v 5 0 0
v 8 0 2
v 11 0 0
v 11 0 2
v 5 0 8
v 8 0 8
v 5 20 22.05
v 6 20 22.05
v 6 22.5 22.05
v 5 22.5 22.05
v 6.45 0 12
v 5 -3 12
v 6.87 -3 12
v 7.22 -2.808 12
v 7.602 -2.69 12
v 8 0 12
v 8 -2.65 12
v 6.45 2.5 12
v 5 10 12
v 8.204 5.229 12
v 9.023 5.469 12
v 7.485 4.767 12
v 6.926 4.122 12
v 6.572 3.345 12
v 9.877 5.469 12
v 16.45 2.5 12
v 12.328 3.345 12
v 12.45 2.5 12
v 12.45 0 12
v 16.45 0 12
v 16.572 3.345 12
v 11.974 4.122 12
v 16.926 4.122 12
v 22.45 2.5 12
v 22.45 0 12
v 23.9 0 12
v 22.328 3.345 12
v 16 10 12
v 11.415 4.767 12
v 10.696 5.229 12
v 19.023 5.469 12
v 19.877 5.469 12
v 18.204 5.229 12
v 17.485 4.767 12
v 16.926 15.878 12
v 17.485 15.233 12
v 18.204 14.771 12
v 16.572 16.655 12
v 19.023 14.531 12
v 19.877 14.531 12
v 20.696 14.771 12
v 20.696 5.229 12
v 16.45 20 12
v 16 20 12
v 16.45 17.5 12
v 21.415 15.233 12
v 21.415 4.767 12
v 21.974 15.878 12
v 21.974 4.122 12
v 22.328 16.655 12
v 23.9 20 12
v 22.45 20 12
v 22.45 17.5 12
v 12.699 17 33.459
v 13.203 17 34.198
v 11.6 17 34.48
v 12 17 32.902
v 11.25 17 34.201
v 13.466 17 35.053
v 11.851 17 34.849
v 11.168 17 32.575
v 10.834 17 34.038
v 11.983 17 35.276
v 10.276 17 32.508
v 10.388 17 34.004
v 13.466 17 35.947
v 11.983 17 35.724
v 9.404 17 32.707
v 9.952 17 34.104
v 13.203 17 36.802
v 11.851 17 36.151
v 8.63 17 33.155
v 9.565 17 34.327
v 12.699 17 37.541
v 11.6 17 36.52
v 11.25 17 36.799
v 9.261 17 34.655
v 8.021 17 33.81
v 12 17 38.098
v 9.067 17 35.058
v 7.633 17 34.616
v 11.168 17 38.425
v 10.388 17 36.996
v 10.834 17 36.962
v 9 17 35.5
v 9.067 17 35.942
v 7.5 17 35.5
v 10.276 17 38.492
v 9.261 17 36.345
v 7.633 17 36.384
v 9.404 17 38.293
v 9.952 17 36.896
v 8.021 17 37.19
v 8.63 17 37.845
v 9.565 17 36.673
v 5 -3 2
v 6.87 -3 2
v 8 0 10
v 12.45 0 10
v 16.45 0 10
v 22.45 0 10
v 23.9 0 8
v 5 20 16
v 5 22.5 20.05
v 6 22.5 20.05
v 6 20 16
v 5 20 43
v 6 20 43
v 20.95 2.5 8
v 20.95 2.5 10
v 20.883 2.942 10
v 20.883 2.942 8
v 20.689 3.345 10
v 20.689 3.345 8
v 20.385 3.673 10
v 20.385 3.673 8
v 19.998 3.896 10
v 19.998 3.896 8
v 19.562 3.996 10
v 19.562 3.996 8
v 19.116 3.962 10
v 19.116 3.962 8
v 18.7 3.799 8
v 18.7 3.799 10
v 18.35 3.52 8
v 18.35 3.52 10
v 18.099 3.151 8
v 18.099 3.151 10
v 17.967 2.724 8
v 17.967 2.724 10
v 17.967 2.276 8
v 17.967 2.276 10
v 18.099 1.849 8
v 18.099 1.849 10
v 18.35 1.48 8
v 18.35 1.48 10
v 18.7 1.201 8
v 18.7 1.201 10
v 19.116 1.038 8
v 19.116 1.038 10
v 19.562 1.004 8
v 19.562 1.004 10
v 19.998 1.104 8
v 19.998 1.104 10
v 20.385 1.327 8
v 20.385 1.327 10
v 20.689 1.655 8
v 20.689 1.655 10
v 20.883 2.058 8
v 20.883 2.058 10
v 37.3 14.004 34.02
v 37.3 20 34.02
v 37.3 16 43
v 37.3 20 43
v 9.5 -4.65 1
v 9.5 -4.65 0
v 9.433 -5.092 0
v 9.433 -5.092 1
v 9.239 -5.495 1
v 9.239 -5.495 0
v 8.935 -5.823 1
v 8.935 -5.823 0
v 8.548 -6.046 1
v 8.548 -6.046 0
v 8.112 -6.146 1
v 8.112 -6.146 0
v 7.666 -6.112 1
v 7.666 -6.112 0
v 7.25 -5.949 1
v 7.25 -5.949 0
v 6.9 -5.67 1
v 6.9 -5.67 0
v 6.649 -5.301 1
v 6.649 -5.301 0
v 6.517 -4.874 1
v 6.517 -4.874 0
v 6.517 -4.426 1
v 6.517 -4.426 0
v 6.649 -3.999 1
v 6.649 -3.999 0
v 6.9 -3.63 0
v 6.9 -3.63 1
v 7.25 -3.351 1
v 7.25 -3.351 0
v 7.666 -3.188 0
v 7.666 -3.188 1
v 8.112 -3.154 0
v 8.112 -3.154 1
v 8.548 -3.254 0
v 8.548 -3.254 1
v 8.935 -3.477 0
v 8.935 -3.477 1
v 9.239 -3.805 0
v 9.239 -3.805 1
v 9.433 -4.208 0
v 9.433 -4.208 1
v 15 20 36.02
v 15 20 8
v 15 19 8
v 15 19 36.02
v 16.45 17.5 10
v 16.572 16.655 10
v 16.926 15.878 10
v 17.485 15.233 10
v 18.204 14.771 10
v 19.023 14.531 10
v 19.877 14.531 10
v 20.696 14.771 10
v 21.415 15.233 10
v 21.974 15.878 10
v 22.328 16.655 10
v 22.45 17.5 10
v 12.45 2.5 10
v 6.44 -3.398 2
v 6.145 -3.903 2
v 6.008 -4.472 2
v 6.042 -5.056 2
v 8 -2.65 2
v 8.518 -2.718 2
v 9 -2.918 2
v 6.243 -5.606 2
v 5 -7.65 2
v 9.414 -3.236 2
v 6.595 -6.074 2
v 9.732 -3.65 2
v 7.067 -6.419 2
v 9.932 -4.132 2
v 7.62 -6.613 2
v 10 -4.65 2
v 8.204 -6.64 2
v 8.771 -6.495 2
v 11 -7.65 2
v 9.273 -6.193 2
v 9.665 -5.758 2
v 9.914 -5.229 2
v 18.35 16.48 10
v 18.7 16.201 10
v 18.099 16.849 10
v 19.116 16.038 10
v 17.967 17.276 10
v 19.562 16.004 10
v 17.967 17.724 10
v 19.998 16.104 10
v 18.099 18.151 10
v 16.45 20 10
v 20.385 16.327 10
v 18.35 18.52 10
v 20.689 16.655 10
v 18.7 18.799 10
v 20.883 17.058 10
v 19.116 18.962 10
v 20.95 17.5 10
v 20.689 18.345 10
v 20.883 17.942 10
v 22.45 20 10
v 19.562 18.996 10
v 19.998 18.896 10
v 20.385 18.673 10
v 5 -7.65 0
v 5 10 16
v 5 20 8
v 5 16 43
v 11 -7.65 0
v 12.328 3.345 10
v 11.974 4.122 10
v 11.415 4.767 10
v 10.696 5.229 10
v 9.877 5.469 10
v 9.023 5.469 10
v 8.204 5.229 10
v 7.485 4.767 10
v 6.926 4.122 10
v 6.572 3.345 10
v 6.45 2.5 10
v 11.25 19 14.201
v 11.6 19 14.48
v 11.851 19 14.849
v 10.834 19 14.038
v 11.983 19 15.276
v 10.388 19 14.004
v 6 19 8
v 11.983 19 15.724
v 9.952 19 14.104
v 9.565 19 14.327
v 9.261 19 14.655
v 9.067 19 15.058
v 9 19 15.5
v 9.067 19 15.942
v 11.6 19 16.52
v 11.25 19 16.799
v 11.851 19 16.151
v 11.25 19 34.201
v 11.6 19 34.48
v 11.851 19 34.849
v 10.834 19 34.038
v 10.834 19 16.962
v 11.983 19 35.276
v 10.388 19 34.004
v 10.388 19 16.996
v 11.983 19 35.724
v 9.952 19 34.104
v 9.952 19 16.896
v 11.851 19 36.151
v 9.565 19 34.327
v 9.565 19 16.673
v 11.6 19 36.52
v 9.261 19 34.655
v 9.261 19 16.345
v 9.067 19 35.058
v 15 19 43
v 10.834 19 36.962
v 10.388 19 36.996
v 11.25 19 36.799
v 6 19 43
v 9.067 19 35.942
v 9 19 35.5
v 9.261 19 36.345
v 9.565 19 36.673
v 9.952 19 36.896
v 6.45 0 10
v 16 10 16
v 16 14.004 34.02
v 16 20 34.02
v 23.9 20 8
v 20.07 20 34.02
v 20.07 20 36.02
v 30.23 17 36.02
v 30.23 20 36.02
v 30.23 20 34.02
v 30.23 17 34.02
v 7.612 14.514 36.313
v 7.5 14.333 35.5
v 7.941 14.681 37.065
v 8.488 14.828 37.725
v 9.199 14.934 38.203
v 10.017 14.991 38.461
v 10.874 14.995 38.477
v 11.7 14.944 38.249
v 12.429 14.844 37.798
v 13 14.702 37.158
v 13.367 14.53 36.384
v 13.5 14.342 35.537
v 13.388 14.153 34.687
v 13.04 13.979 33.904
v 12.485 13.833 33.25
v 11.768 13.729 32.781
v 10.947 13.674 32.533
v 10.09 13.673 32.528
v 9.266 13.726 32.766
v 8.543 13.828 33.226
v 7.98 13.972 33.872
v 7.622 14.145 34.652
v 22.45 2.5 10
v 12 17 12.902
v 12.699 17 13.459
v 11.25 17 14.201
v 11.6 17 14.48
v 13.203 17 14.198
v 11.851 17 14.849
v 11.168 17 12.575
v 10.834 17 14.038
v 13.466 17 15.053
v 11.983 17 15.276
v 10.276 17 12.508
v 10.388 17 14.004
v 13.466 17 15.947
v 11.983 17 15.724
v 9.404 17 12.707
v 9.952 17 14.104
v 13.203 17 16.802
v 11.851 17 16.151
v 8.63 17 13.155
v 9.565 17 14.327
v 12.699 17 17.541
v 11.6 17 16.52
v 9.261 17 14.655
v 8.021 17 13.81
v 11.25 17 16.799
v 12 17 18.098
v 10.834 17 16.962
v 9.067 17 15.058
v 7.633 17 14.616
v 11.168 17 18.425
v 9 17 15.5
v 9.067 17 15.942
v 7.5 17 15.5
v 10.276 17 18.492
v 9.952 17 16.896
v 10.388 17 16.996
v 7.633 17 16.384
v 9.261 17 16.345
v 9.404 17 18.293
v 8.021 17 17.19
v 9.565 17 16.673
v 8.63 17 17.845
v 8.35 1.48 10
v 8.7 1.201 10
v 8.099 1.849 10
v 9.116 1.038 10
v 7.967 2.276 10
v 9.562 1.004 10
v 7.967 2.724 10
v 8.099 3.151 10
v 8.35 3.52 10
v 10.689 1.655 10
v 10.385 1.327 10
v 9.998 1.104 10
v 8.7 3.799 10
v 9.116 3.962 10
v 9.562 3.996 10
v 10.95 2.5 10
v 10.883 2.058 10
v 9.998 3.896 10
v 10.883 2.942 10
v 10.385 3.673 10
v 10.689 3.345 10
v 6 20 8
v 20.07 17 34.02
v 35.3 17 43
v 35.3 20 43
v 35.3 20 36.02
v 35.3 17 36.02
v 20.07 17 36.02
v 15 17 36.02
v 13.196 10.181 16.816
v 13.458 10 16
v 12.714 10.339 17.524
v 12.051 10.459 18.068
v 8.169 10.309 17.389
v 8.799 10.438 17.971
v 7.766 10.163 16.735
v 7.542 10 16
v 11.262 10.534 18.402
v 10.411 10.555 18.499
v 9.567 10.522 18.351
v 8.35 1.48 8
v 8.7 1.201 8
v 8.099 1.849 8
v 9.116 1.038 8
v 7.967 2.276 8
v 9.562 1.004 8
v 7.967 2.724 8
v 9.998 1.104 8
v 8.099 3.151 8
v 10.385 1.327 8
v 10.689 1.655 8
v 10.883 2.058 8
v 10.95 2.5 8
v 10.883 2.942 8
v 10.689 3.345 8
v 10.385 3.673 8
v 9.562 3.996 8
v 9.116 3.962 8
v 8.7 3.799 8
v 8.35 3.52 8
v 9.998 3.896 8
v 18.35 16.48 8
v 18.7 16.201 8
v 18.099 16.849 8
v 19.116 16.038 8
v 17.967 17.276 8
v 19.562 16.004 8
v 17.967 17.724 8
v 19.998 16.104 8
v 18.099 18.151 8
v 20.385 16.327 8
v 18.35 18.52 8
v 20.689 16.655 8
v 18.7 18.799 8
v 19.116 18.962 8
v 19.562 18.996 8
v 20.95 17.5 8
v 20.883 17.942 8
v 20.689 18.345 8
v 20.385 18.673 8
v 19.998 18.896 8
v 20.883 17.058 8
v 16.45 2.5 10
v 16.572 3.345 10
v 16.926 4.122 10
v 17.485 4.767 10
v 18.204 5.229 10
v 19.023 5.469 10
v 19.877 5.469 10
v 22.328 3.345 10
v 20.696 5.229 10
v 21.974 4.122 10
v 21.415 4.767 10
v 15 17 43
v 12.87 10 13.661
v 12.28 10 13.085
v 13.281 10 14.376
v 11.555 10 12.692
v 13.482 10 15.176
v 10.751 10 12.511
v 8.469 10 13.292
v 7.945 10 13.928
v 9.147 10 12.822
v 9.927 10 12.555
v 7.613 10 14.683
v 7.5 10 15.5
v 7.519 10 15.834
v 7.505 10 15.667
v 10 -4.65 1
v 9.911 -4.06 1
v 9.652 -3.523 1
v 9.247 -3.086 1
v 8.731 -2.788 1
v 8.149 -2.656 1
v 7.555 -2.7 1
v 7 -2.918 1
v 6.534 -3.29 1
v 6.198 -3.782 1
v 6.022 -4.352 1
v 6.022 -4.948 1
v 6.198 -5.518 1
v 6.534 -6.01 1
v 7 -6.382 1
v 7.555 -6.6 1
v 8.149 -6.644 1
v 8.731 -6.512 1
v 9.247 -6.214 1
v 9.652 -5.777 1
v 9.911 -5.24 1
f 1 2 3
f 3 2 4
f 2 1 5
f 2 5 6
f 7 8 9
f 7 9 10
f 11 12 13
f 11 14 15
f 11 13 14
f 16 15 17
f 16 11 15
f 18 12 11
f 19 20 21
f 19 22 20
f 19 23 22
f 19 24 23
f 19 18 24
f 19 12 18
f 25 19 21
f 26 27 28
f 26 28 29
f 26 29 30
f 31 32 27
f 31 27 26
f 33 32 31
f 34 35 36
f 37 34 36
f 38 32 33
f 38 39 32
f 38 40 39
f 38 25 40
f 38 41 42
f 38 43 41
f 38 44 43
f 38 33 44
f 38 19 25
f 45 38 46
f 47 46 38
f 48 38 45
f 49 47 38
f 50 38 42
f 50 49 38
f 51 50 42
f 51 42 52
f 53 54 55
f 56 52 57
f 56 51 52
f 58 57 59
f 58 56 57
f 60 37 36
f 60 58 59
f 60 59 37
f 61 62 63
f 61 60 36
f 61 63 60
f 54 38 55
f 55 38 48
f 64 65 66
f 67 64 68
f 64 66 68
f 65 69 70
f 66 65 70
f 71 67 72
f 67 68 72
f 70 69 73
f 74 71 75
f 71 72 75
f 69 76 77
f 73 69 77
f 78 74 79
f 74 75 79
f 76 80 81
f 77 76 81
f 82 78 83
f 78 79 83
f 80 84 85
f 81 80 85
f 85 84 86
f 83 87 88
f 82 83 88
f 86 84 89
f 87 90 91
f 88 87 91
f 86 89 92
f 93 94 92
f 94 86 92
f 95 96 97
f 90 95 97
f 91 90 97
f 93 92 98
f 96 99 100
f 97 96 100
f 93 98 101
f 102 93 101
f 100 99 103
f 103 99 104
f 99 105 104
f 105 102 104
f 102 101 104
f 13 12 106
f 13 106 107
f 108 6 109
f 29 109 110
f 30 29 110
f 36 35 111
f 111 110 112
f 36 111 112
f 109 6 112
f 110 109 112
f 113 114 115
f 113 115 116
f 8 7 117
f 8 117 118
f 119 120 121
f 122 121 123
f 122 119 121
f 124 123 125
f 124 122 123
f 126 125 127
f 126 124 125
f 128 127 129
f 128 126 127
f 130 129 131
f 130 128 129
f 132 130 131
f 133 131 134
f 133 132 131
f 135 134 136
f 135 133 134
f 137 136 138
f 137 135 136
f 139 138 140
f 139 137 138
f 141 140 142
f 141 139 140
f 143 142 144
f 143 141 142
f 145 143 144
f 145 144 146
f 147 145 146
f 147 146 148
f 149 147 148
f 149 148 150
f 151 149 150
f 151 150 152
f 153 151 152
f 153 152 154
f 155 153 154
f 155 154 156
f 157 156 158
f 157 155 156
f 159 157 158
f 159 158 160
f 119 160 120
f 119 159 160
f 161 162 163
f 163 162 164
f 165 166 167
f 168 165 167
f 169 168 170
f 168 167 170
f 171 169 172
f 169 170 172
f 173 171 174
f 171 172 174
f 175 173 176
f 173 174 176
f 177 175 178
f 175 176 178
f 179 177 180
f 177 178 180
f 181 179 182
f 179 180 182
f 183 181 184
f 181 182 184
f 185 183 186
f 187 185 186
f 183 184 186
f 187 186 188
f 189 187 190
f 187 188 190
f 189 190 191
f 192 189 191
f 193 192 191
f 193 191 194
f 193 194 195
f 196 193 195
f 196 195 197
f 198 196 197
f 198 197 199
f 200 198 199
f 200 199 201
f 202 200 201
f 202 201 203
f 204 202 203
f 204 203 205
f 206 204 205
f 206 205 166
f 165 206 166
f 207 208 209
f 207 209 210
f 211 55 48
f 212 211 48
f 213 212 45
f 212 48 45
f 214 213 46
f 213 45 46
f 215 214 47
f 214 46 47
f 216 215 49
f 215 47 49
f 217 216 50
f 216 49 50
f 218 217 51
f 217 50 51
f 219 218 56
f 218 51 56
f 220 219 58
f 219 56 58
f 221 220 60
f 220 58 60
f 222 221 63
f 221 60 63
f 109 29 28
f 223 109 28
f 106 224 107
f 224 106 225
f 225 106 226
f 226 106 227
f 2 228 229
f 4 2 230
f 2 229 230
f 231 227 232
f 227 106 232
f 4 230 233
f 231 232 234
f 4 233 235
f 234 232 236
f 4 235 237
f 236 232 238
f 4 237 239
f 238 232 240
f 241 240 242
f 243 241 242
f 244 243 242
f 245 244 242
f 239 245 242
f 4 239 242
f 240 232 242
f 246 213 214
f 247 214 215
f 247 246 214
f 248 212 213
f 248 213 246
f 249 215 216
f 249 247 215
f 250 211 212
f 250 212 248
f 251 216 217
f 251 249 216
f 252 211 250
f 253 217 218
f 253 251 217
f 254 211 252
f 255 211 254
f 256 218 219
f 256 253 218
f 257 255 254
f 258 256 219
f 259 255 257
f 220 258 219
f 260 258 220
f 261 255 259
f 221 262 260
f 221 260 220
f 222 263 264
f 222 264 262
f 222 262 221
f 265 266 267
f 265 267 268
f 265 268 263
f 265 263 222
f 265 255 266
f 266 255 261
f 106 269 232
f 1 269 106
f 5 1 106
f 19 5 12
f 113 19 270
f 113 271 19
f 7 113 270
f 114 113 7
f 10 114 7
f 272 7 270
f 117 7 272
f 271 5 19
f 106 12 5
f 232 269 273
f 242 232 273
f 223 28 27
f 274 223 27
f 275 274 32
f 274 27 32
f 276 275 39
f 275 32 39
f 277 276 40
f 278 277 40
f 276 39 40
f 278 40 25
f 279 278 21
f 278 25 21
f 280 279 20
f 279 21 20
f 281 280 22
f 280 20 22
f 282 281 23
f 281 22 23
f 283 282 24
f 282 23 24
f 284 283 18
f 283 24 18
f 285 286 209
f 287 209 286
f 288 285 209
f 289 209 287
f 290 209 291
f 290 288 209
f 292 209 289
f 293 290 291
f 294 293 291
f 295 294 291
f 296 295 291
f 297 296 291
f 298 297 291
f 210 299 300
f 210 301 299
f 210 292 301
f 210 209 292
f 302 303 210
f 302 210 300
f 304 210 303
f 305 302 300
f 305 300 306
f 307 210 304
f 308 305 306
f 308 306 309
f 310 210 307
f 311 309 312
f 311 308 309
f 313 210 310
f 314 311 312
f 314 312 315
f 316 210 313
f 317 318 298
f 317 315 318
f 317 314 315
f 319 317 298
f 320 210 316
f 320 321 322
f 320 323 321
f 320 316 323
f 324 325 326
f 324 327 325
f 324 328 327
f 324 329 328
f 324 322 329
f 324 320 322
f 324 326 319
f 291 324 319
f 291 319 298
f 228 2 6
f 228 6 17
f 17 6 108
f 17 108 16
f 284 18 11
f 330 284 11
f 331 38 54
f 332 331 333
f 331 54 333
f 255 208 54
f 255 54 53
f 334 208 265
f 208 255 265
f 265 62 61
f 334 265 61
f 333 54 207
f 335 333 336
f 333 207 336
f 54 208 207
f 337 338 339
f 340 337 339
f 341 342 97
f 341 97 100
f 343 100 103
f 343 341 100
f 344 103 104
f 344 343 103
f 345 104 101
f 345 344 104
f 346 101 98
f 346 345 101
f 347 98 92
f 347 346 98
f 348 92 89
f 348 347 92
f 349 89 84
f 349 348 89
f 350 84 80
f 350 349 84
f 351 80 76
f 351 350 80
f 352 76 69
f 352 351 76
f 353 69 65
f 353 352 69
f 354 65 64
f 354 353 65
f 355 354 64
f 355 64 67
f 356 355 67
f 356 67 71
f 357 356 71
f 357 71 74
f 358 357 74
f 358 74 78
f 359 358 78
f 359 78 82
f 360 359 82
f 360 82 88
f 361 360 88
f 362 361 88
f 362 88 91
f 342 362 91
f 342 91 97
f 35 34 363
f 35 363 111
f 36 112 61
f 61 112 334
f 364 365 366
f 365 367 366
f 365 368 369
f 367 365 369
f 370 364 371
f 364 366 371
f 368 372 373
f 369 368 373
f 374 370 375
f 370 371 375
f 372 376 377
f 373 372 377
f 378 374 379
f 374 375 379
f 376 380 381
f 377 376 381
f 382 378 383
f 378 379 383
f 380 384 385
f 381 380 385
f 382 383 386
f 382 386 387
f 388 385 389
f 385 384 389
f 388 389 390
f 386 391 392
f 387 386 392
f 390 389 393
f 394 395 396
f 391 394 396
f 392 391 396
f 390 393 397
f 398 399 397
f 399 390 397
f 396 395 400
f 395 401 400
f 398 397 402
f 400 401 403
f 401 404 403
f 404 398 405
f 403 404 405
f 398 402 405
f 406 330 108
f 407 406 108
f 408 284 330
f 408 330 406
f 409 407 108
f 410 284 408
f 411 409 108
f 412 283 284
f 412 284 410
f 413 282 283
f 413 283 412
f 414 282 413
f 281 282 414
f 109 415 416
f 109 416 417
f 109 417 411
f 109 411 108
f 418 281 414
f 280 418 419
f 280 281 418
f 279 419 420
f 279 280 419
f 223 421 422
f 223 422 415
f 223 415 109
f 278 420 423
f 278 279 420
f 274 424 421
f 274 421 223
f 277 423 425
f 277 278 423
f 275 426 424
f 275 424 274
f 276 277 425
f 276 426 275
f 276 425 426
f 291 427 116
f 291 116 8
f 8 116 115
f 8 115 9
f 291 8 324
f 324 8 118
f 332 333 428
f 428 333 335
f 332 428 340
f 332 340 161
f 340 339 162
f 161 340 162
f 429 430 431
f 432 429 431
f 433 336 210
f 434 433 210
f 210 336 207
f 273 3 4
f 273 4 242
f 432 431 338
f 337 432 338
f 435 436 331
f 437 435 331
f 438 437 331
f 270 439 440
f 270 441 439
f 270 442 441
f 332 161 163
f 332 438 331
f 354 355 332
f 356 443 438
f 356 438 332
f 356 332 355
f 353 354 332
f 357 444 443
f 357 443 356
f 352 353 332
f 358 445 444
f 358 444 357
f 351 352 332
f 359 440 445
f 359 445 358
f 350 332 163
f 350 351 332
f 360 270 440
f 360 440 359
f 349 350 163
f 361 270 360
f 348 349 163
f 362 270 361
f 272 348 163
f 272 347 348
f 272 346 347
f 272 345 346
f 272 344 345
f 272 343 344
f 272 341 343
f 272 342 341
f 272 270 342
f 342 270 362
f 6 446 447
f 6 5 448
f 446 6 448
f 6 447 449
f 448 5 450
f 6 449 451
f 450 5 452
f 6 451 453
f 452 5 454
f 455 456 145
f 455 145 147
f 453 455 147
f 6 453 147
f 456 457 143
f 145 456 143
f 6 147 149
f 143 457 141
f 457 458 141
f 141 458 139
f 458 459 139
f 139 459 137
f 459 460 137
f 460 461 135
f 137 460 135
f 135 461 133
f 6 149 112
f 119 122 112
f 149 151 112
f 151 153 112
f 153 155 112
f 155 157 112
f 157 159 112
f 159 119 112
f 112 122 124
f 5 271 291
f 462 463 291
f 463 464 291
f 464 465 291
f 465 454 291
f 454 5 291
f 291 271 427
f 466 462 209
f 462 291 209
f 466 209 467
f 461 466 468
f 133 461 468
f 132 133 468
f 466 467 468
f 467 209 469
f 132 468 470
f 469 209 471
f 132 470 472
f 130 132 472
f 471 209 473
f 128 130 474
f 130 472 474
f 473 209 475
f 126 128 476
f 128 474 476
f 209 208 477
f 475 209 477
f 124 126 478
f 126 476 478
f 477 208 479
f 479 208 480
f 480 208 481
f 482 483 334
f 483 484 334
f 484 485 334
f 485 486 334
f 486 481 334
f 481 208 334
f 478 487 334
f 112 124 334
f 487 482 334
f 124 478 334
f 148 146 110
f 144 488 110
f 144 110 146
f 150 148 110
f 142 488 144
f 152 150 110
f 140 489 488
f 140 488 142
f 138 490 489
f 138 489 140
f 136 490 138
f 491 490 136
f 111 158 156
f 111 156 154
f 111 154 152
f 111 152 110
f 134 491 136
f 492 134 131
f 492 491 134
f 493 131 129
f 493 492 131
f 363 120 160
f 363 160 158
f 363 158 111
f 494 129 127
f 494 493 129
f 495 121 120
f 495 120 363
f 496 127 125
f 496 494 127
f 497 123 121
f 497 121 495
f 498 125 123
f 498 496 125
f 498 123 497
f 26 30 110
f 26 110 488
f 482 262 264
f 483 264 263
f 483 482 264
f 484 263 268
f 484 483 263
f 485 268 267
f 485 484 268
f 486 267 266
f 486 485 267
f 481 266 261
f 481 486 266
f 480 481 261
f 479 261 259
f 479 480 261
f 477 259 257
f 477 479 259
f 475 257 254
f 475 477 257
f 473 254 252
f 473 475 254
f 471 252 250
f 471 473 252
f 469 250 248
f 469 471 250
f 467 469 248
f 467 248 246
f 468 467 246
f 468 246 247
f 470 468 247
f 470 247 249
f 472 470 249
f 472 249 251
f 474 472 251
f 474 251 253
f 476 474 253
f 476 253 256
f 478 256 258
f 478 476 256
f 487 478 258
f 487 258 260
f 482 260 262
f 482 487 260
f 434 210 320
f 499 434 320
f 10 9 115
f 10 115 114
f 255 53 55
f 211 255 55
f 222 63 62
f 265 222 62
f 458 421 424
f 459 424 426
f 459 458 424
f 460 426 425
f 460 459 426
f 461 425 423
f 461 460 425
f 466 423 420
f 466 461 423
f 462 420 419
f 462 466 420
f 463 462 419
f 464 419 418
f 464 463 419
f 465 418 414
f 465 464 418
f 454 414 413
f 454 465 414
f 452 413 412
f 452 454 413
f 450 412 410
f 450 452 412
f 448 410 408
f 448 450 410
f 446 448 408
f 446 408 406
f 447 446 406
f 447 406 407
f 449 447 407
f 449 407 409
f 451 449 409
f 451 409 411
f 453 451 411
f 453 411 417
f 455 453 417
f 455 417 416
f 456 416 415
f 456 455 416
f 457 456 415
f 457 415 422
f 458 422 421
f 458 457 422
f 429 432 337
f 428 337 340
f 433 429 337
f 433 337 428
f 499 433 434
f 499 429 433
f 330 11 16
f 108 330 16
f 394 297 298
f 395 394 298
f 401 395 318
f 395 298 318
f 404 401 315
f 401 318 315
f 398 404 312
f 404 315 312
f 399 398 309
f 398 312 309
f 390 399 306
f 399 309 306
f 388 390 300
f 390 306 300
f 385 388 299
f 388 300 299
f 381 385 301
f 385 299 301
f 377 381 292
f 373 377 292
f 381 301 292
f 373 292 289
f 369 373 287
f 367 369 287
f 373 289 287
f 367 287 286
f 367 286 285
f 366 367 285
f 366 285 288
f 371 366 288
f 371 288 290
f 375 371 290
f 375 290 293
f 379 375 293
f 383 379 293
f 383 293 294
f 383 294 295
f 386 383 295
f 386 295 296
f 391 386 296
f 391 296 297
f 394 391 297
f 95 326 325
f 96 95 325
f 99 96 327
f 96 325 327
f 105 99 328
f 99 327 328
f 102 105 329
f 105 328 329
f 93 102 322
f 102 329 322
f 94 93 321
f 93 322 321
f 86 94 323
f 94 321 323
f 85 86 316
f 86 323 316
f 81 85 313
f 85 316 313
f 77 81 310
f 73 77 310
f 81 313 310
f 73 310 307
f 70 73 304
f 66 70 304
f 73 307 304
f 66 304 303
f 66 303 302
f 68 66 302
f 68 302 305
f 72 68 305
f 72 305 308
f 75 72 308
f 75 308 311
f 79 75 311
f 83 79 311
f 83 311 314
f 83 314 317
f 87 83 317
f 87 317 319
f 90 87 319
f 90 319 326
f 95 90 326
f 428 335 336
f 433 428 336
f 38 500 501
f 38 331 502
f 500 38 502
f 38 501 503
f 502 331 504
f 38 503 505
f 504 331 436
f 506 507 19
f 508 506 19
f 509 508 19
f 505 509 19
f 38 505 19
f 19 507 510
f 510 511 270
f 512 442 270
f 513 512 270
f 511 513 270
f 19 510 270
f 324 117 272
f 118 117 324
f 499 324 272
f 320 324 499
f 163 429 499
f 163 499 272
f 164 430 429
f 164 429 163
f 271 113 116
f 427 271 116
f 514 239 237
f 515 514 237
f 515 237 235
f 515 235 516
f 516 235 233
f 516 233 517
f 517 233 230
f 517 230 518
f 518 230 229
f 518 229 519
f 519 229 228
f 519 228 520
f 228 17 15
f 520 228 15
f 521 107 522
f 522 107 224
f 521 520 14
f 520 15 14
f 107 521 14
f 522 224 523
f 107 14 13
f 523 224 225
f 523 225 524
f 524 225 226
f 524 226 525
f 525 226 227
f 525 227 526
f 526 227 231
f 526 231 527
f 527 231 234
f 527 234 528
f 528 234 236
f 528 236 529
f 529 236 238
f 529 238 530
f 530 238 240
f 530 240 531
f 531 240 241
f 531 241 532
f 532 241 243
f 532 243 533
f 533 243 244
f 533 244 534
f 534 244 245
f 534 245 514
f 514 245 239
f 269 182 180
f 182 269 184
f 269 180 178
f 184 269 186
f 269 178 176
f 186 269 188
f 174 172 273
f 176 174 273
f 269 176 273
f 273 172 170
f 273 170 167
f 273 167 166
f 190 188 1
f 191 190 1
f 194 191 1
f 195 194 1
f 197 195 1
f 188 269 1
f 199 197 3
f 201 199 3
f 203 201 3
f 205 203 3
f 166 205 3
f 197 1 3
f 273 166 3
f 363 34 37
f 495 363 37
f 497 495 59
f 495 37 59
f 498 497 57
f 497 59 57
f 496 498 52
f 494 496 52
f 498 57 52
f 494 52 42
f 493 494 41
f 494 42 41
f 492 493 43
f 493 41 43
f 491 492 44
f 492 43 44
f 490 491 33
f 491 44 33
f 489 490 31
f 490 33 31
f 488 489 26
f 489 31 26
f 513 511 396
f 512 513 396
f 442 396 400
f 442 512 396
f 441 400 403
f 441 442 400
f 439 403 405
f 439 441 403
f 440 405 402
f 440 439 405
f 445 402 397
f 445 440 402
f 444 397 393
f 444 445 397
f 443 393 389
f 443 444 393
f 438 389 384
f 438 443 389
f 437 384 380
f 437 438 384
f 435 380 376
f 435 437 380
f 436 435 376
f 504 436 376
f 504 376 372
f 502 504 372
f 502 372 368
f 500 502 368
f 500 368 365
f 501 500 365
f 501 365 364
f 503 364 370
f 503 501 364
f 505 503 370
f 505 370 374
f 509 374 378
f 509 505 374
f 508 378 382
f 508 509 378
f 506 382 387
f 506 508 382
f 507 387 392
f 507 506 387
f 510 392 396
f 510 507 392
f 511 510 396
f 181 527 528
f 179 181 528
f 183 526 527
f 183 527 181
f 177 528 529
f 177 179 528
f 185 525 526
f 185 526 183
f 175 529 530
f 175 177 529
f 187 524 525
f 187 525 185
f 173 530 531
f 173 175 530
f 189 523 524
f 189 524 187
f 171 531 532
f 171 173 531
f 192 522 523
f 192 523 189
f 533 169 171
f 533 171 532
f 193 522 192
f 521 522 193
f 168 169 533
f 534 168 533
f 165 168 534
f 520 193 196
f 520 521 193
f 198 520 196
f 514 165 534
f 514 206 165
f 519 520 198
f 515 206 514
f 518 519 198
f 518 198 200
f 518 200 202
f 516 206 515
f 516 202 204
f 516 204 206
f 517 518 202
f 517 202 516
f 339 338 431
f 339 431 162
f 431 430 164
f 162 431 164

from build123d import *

# Parameters (mm, degrees)
SKETCH_W        = 18.9
SKETCH_H        = 20
SKETCH_R        = 1.5
PAD_DEPTH       = 8
SKETCH001_W     = 3
SKETCH001_H     = 16
PAD001_DEPTH    = 3
SKETCH002_W     = 6
SKETCH002_H     = 7.65
SKETCH002_R     = 1.5
PAD002_DEPTH    = 2
SKETCH003_R     = 2
POCKET_DEPTH    = 15
PAD003_DEPTH    = 10
SKETCH005_R     = 1.5
POCKET001_DEPTH = 10
SKETCH006_W     = 9
SKETCH006_H     = 35
POCKET002_DEPTH = 1
POCKET003_DEPTH = 3
SKETCH008_W     = 1
SKETCH008_H     = 6.05
PAD004_DEPTH    = 2.5
POCKET004_DEPTH = 32.301
POCKET005_DEPTH = 32.301
POCKET014_DEPTH = 6
POCKET015_DEPTH = 4
SKETCH023_R     = 3
POCKET017_DEPTH = 8


with BuildPart() as part:
    # Sketch (on Face6 of Binder) → Pad (new body)
    with BuildSketch(Plane.XY.offset(8)):
        with Locations((14.45, 10)):
            Rectangle(SKETCH_W, SKETCH_H)
        with Locations((19.45, 17.5)):
            Circle(SKETCH_R, mode=Mode.SUBTRACT)
        with Locations((9.45, 2.5)):
            Circle(SKETCH_R, mode=Mode.SUBTRACT)
        with Locations((19.45, 2.5)):
            Circle(SKETCH_R, mode=Mode.SUBTRACT)
    extrude(amount=PAD_DEPTH)

    # Sketch001 (on Face3 of Pad) → Pad001 (join)
    with BuildSketch(Plane.XZ):
        with Locations((6.5, 8)):
            Rectangle(SKETCH001_W, SKETCH001_H)
    extrude(amount=PAD001_DEPTH)

    # Sketch002 (on Face13 of Pad001) → Pad002 (join)
    with BuildSketch(Plane(origin=(0, 0, 0), x_dir=(1, 0, 0), z_dir=(0, 0, -1))):
        with Locations((8, 3.825)):
            Rectangle(SKETCH002_W, SKETCH002_H)
        with Locations((8, 4.65)):
            Circle(SKETCH002_R, mode=Mode.SUBTRACT)
    extrude(amount=-PAD002_DEPTH)

    # Sketch003 (on Face12 of Pad002) → Pocket (cut)
    with BuildSketch(Plane.XY.offset(16)):
        with Locations((8, -4.65)):
            Circle(SKETCH003_R)
    extrude(amount=-POCKET_DEPTH, mode=Mode.SUBTRACT)

    # Sketch004 (on Face1 of Pocket) → Pad003 (join)
    with BuildSketch(Plane(origin=(0, 20, 0), x_dir=(-1, 0, 0), z_dir=(0, 1, 0))):
        Polygon((-5, 16), (-16, 16), (-16, 34.02), (-37.3, 34.02), (-37.3, 43), (-16, 43), (-5, 43), align=None)
    extrude(amount=-PAD003_DEPTH)

    # Sketch005 (on Face5 of Pad003) → Pocket001 (cut)
    with BuildSketch(Plane(origin=(0, 20, 0), x_dir=(-1, 0, 0), z_dir=(0, 1, 0))):
        with Locations((-10.5, 15.5)):
            Circle(SKETCH005_R)
        with Locations((-10.5, 35.5)):
            Circle(SKETCH005_R)
    extrude(amount=-POCKET001_DEPTH, mode=Mode.SUBTRACT)

    # Sketch006 (on Face5 of Pocket001) → Pocket002 (cut)
    with BuildSketch(Plane(origin=(0, 20, 0), x_dir=(-1, 0, 0), z_dir=(0, 1, 0))):
        with Locations((-10.5, 25.5)):
            Rectangle(SKETCH006_W, SKETCH006_H)
    extrude(amount=-POCKET002_DEPTH, mode=Mode.SUBTRACT)

    # Sketch007 (on Face21 of Pocket002) → Pocket003 (cut)
    with BuildSketch(Plane(origin=(0, 20, 0), x_dir=(-1, 0, 0), z_dir=(0, 1, 0))):
        Polygon((-15, 43), (-35.3, 43), (-35.3, 36.02), (-30.23, 36.02), (-30.23, 34.02), (-20.07, 34.02), (-20.07, 36.02), (-15, 36.02), align=None)
    extrude(amount=-POCKET003_DEPTH, mode=Mode.SUBTRACT)

    # Sketch008 (on Face4 of Pocket003) → Pad004 (join)
    with BuildSketch(Plane(origin=(0, 20, 0), x_dir=(-1, 0, 0), z_dir=(0, 1, 0))):
        with Locations((-5.5, 19.025)):
            Rectangle(SKETCH008_W, SKETCH008_H)
    extrude(amount=PAD004_DEPTH)

    # Sketch009 (on Face18 of Pad004) → Pocket004 (cut, through all)
    with BuildSketch(Plane(origin=(5, 0, 0), x_dir=(0, -1, 0), z_dir=(-1, 0, 0))):
        Polygon((-22.5, 20.05), (-20, 16), (-22.5, 16), align=None)
    extrude(amount=-POCKET004_DEPTH, mode=Mode.SUBTRACT)

    # Sketch010 (on Face22 of Pocket004) → Pocket005 (cut, through all)
    with BuildSketch(Plane(origin=(5, 0, 0), x_dir=(0, -1, 0), z_dir=(-1, 0, 0))):
        Polygon((-10, 16), (-16, 43), (-10, 43), align=None)
    extrude(amount=-POCKET005_DEPTH, mode=Mode.SUBTRACT)

    # Sketch020 (on Face21 of Pocket005) → Pocket014 (cut)
    with BuildSketch(Plane.XY.offset(16)):
        with BuildLine():
            ThreePointArc((16.45, 17.499996), (19.45, 14.5), (22.45, 17.499996))
            Line((22.45, 17.499996), (22.45, 20))
            Line((22.45, 20), (16.45, 20))
            Line((16.45, 20), (16.45, 17.499996))
        make_face()
        with BuildLine():
            ThreePointArc((22.45, 2.5), (19.45, 5.5), (16.45, 2.5))
            Line((16.45, 0), (16.45, 2.5))
            Line((22.45, 0), (16.45, 0))
            Line((22.45, 2.5), (22.45, 0))
        make_face()
        with BuildLine():
            ThreePointArc((12.45, 2.5), (9.45, 5.5), (6.45, 2.5))
            Line((6.45, 2.5), (6.45, 0))
            Line((6.45, 0), (12.45, 0))
            Line((12.45, 0), (12.45, 2.5))
        make_face()
    extrude(amount=-POCKET014_DEPTH, mode=Mode.SUBTRACT)

    # Sketch021 (on Face21 of Pocket014) → Pocket015 (cut)
    with BuildSketch(Plane.XY.offset(16)):
        Polygon((23.9, 0), (23.9, 10), (23.9, 20), (16, 20), (16, 10), (5, 10), (5, 0), (5, -3), (8, -3), (8, 0), align=None)
    extrude(amount=-POCKET015_DEPTH, mode=Mode.SUBTRACT)

    # Sketch023 (on Face6 of Pocket015) → Pocket017 (cut)
    with BuildSketch(Plane(origin=(0, 9, 0), x_dir=(-1, 0, 0), z_dir=(0, 1, 0))):
        with Locations((-10.5, 15.5)):
            Circle(SKETCH023_R)
        with Locations((-10.5, 35.5)):
            Circle(SKETCH023_R)
    extrude(amount=POCKET017_DEPTH, mode=Mode.SUBTRACT)


solid = part.part
